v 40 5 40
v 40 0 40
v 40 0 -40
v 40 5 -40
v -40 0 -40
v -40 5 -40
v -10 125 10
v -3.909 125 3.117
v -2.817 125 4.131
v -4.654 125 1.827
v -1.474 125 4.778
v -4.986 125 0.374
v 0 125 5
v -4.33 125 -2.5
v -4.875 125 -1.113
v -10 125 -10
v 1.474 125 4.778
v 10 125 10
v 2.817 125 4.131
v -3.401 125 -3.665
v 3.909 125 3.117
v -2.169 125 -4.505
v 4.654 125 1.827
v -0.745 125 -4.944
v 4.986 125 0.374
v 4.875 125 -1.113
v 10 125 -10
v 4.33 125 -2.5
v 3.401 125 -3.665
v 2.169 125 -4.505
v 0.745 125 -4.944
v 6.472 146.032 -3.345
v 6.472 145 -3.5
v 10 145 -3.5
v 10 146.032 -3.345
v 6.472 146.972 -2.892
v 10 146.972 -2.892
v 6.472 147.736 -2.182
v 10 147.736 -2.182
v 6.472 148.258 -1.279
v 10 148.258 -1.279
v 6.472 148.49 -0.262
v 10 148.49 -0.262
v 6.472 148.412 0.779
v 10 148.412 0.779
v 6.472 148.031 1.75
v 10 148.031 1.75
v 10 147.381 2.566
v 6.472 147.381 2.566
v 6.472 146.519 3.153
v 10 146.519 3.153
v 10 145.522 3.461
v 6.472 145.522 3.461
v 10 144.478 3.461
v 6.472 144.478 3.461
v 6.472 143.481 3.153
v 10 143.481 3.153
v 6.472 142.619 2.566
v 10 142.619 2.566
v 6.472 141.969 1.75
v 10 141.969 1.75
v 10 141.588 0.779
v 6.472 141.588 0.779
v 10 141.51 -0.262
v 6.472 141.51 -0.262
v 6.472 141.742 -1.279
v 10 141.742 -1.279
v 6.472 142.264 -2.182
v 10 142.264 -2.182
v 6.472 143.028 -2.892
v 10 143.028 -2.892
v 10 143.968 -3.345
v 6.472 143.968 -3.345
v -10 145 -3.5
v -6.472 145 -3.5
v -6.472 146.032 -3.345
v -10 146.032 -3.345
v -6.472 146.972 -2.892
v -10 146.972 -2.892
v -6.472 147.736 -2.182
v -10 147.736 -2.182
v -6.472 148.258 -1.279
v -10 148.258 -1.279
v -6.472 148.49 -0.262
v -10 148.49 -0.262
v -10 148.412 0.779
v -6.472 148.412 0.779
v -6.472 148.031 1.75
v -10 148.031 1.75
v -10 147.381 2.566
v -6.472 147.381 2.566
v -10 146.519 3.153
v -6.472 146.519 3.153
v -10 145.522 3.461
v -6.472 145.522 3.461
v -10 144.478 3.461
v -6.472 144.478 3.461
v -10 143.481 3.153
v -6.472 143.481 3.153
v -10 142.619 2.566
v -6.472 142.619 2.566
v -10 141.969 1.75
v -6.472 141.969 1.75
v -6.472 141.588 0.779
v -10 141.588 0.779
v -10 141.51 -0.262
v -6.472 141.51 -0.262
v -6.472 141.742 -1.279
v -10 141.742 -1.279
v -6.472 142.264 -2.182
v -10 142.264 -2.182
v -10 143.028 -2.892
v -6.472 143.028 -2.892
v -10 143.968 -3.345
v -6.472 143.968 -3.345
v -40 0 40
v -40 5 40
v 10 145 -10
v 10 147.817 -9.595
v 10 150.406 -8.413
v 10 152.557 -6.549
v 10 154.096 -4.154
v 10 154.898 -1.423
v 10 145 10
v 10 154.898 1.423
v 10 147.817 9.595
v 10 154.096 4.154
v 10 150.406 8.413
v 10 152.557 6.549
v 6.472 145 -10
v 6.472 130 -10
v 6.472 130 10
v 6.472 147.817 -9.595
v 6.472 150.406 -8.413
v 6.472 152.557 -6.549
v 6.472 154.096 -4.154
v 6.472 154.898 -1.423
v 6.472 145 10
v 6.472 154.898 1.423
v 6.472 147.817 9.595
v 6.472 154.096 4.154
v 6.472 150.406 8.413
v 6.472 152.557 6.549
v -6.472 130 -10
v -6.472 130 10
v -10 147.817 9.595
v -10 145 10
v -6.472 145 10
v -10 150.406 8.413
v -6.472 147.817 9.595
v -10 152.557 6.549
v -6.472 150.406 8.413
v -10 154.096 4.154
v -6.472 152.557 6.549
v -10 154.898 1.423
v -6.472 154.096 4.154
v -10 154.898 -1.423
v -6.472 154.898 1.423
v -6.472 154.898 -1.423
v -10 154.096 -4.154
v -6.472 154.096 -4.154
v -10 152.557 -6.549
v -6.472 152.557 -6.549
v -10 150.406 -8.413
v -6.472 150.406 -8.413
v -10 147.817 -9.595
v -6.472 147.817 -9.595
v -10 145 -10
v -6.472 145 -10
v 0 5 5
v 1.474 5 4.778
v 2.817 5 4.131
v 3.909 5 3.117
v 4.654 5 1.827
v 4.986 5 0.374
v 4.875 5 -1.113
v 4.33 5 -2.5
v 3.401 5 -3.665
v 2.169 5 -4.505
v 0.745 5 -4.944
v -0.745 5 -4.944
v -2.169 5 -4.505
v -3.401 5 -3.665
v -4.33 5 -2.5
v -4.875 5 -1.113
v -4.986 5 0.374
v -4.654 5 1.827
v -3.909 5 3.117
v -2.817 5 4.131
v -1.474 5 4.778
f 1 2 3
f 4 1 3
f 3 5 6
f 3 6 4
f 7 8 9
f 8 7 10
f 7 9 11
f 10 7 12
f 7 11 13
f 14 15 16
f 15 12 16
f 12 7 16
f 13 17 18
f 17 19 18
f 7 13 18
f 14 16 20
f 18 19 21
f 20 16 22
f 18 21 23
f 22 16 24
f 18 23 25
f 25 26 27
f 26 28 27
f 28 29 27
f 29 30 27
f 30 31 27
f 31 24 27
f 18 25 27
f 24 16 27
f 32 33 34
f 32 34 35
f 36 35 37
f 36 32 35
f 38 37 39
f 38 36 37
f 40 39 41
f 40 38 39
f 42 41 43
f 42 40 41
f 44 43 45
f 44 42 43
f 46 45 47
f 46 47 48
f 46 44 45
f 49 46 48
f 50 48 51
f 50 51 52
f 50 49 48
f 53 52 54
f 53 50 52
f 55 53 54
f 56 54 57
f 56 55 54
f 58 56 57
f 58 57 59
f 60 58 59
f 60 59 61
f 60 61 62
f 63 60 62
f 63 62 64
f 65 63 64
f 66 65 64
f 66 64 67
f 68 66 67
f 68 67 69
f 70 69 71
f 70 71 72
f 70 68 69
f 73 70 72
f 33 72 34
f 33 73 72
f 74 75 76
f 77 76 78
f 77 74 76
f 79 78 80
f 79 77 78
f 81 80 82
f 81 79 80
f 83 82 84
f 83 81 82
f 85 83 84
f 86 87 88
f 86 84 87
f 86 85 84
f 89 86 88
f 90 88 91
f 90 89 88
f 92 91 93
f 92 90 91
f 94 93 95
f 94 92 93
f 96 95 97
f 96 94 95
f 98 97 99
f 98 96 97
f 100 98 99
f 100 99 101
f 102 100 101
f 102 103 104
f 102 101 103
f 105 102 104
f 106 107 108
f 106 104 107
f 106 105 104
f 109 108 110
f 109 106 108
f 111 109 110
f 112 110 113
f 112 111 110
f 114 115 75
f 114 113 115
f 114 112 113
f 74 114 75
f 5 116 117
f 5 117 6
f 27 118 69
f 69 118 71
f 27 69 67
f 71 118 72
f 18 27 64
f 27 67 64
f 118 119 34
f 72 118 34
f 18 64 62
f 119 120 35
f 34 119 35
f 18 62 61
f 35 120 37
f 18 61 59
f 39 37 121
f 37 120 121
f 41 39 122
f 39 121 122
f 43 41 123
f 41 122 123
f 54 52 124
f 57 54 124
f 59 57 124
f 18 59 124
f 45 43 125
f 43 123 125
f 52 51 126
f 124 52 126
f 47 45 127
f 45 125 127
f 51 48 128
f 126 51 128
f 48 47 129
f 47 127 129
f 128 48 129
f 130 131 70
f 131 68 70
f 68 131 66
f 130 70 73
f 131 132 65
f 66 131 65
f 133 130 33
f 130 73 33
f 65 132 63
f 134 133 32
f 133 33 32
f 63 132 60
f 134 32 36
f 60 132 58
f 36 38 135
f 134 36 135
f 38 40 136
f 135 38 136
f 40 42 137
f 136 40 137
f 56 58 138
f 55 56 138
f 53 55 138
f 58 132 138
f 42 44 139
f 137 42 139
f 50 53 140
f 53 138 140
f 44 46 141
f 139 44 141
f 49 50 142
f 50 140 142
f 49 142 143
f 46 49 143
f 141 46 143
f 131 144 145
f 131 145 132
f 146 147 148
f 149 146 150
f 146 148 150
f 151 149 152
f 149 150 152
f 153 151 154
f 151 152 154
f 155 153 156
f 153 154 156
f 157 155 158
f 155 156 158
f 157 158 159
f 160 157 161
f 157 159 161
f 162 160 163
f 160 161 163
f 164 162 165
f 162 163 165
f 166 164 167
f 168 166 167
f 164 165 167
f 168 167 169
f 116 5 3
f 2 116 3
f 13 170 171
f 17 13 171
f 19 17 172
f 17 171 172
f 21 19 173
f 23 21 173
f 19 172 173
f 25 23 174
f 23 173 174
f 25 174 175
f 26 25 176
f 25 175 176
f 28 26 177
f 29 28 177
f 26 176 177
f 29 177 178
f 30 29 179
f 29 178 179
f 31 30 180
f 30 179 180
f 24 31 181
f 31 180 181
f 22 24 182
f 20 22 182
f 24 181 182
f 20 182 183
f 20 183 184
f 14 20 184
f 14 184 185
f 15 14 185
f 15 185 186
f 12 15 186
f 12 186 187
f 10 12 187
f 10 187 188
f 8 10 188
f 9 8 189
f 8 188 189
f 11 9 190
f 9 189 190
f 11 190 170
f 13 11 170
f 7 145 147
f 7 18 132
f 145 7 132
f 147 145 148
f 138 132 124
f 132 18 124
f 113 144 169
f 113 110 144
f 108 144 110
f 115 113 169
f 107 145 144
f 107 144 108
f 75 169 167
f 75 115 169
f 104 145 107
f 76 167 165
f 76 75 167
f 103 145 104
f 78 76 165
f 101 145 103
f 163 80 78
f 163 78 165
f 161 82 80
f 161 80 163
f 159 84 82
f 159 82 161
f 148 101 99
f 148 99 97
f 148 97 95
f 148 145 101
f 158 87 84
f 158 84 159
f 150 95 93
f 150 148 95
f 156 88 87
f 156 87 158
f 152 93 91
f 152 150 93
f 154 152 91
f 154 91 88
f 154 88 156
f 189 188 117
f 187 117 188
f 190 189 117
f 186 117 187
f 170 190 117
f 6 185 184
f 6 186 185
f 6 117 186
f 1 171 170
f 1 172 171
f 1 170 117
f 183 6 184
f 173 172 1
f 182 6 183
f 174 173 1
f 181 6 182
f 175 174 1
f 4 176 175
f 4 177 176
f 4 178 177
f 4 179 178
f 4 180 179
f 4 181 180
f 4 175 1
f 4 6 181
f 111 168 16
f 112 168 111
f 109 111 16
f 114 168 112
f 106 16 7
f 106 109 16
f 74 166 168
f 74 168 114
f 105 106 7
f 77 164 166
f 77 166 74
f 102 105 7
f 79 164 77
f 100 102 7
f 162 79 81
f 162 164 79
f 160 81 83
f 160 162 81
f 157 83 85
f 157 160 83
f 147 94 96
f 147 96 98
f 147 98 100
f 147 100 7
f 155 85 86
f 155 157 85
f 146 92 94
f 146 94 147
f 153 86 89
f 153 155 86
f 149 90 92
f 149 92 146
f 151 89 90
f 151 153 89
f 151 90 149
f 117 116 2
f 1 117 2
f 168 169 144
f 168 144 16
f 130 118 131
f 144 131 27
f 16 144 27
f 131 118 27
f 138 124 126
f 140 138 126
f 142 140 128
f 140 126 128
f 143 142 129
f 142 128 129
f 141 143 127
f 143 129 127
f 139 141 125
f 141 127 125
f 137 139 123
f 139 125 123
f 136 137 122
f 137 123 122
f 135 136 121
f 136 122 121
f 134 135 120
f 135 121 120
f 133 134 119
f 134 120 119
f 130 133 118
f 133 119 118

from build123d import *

# Parameters (mm, degrees)
ESBO_O10_W               = 80
ESBO_O10_H               = 80
RESSALTO_EXTRUS_O4_DEPTH = 5
ESBO_O11_R               = 5
RESSALTO_EXTRUS_O5_DEPTH = 120
ESBO_O12_W               = 20
ESBO_O12_H               = 20
RESSALTO_EXTRUS_O6_DEPTH = 5
ESBO_O13_R               = 3.5
RESSALTO_EXTRUS_O7_DEPTH = 10
ESBO_O16_W               = 12.944950436
ESBO_O16_H               = 50
CORTE_EXTRUS_O8_DEPTH    = 20


with BuildPart() as part:
    # Esboço10 → Ressalto-extrusão4 (new body)
    with BuildSketch(Plane(origin=(0, 0, 0), x_dir=(1, 0, 0), z_dir=(0, 1, 0))):
        Rectangle(ESBO_O10_W, ESBO_O10_H)
    extrude(amount=RESSALTO_EXTRUS_O4_DEPTH)

    # Esboço11 → Ressalto-extrusão5 (add)
    with BuildSketch(Plane(origin=(0, 5, 0), x_dir=(1, 0, 0), z_dir=(0, 1, 0))):
        with Locations(Location((0, 0, 0), (0, 0, 270))):
            Circle(ESBO_O11_R)
    extrude(amount=RESSALTO_EXTRUS_O5_DEPTH)

    # Esboço12 → Ressalto-extrusão6 (add)
    with BuildSketch(Plane(origin=(0, 125, 0), x_dir=(1, 0, 0), z_dir=(0, 1, 0))):
        Rectangle(ESBO_O12_W, ESBO_O12_H)
    extrude(amount=RESSALTO_EXTRUS_O6_DEPTH)

    # Esboço13 → Ressalto-extrusão7 (add, symmetric)
    with BuildSketch(Plane(origin=(0, 0, 0), x_dir=(0, 0, -1), z_dir=(1, 0, 0))):
        with BuildLine():
            Line((10, 130), (-10, 130))
            Line((-10, 130), (-10, 145))
            ThreePointArc((-10, 145), (0, 155), (10, 145))
            Line((10, 145), (10, 130))
        make_face()
        with Locations((0, 145)):
            Circle(ESBO_O13_R, mode=Mode.SUBTRACT)
    extrude(amount=RESSALTO_EXTRUS_O7_DEPTH, both=True)

    # Esboço16 → Corte-extrusão8 (cut, symmetric)
    with BuildSketch(Plane.XY):
        with Locations((0, 155)):
            Rectangle(ESBO_O16_W, ESBO_O16_H)
    extrude(amount=CORTE_EXTRUS_O8_DEPTH, both=True, mode=Mode.SUBTRACT)


solid = part.part
